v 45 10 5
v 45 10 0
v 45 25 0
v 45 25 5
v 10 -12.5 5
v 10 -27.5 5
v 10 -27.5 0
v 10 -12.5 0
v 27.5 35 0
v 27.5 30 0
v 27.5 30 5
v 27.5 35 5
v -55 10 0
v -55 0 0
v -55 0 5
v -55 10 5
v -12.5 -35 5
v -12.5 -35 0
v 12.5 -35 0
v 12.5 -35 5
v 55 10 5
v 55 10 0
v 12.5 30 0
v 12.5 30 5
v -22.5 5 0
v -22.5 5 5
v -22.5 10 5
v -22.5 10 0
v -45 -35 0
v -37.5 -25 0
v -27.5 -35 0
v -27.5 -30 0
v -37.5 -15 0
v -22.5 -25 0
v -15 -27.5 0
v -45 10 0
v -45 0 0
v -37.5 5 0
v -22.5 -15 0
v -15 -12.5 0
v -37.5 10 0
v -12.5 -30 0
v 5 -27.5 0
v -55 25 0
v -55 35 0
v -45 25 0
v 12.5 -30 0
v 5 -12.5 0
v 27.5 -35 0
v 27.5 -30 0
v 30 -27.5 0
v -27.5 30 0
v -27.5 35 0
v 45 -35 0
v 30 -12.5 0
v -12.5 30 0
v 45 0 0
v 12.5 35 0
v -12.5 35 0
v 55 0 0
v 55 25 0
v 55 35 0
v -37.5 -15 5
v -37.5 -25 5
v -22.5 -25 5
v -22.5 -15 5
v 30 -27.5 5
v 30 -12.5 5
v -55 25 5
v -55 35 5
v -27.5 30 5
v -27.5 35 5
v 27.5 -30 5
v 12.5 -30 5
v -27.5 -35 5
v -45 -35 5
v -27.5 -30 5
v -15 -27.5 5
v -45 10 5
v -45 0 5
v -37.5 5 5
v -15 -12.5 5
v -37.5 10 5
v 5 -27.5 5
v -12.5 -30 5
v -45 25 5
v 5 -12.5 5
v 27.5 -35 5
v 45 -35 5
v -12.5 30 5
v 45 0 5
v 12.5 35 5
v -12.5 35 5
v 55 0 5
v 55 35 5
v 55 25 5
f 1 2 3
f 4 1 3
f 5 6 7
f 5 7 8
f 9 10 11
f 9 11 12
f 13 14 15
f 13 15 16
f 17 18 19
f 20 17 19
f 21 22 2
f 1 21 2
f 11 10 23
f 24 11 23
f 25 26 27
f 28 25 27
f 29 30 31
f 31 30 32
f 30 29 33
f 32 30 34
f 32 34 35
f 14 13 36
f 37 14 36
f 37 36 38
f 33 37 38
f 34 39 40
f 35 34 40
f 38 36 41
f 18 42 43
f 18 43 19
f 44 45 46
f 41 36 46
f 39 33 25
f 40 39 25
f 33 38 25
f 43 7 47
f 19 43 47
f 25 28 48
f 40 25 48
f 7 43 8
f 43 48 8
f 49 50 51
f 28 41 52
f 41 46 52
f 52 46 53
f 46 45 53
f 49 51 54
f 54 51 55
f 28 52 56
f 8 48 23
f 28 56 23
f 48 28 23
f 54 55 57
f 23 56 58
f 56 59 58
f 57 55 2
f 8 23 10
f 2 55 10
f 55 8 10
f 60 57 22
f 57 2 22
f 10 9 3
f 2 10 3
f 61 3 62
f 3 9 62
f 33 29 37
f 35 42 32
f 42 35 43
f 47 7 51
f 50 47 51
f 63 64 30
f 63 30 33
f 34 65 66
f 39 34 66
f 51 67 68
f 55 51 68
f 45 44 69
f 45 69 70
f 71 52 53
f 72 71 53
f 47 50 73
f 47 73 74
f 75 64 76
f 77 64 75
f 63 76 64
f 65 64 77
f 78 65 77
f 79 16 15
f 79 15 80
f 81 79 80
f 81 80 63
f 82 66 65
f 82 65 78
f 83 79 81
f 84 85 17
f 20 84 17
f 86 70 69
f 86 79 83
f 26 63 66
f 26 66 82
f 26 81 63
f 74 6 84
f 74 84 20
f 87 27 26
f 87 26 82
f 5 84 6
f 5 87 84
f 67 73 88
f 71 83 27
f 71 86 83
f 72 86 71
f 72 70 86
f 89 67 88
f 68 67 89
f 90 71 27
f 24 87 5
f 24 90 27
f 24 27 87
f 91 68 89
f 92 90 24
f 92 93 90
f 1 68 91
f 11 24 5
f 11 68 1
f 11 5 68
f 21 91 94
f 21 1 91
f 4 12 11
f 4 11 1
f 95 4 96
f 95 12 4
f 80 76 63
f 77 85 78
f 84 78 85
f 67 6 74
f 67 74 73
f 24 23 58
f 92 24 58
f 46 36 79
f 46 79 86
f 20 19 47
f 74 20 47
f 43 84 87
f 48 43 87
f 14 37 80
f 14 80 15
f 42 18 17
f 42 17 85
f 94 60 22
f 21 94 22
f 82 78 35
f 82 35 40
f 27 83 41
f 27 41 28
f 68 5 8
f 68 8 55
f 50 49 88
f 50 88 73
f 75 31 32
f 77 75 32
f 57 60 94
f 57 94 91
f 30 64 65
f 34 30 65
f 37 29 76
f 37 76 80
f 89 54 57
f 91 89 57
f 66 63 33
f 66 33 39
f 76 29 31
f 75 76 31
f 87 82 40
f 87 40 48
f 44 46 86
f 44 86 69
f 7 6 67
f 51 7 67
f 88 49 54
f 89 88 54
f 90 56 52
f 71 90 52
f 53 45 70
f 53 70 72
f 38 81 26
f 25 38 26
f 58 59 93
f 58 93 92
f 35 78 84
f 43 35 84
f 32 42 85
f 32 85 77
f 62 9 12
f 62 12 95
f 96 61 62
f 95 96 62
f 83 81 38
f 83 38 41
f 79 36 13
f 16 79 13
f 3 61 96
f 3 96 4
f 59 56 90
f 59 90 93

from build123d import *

# Parameters (mm, degrees)
ESQUISSE1_W             = 110
ESQUISSE1_H             = 70
BOSS_EXTRU_1_DEPTH      = 5
ESQUISSE2_W             = 20
ESQUISSE2_H             = 15
ESQUISSE2_W_2           = 15
ESQUISSE2_H_2           = 10
ESQUISSE2_H_3           = 5
ENL_V_MAT_EXTRU_1_DEPTH = 5
ESQUISSE6_W             = 10
ESQUISSE6_H             = 35
ESQUISSE6_H_2           = 15
ESQUISSE6_W_2           = 15
ESQUISSE6_H_3           = 5
ENL_V_MAT_EXTRU_2_DEPTH = 5


with BuildPart() as part:
    # Esquisse1 → Boss.-Extru.1 (new body)
    with BuildSketch(Plane.XY):
        Rectangle(ESQUISSE1_W, ESQUISSE1_H)
    extrude(amount=BOSS_EXTRU_1_DEPTH)

    # Esquisse2 → Enlèv. mat.-Extru.1 (cut)
    with BuildSketch(Plane.XY.offset(5)):
        with Locations((20, -20)):
            Rectangle(ESQUISSE2_W, ESQUISSE2_H)
        with Locations((-5, -20)):
            Rectangle(ESQUISSE2_W, ESQUISSE2_H)
        with Locations((-30, -20)):
            Rectangle(ESQUISSE2_W_2, ESQUISSE2_H_2)
        with Locations((-30, 7.5)):
            Rectangle(ESQUISSE2_W_2, ESQUISSE2_H_3)
    extrude(amount=-ENL_V_MAT_EXTRU_1_DEPTH, mode=Mode.SUBTRACT)

    # Esquisse6 → Enlèv. mat.-Extru.2 (cut)
    with BuildSketch(Plane(origin=(0, 0, 0), x_dir=(-1, 0, 0), z_dir=(0, 0, -1))):
        with Locations((-50, -17.5)):
            Rectangle(ESQUISSE6_W, ESQUISSE6_H)
        with Locations((50, -17.5)):
            Rectangle(ESQUISSE6_W, ESQUISSE6_H)
        with Locations((-50, 17.5)):
            Rectangle(ESQUISSE6_W, ESQUISSE6_H_2)
        with Locations((50, 17.5)):
            Rectangle(ESQUISSE6_W, ESQUISSE6_H_2)
        with Locations((-20, 32.5)):
            Rectangle(ESQUISSE6_W_2, ESQUISSE6_H_3)
        with Locations((20, 32.5)):
            Rectangle(ESQUISSE6_W_2, ESQUISSE6_H_3)
        with Locations((-20, -32.5)):
            Rectangle(ESQUISSE6_W_2, ESQUISSE6_H_3)
        with Locations((20, -32.5)):
            Rectangle(ESQUISSE6_W_2, ESQUISSE6_H_3)
    extrude(amount=-ENL_V_MAT_EXTRU_2_DEPTH, mode=Mode.SUBTRACT)


solid = part.part
